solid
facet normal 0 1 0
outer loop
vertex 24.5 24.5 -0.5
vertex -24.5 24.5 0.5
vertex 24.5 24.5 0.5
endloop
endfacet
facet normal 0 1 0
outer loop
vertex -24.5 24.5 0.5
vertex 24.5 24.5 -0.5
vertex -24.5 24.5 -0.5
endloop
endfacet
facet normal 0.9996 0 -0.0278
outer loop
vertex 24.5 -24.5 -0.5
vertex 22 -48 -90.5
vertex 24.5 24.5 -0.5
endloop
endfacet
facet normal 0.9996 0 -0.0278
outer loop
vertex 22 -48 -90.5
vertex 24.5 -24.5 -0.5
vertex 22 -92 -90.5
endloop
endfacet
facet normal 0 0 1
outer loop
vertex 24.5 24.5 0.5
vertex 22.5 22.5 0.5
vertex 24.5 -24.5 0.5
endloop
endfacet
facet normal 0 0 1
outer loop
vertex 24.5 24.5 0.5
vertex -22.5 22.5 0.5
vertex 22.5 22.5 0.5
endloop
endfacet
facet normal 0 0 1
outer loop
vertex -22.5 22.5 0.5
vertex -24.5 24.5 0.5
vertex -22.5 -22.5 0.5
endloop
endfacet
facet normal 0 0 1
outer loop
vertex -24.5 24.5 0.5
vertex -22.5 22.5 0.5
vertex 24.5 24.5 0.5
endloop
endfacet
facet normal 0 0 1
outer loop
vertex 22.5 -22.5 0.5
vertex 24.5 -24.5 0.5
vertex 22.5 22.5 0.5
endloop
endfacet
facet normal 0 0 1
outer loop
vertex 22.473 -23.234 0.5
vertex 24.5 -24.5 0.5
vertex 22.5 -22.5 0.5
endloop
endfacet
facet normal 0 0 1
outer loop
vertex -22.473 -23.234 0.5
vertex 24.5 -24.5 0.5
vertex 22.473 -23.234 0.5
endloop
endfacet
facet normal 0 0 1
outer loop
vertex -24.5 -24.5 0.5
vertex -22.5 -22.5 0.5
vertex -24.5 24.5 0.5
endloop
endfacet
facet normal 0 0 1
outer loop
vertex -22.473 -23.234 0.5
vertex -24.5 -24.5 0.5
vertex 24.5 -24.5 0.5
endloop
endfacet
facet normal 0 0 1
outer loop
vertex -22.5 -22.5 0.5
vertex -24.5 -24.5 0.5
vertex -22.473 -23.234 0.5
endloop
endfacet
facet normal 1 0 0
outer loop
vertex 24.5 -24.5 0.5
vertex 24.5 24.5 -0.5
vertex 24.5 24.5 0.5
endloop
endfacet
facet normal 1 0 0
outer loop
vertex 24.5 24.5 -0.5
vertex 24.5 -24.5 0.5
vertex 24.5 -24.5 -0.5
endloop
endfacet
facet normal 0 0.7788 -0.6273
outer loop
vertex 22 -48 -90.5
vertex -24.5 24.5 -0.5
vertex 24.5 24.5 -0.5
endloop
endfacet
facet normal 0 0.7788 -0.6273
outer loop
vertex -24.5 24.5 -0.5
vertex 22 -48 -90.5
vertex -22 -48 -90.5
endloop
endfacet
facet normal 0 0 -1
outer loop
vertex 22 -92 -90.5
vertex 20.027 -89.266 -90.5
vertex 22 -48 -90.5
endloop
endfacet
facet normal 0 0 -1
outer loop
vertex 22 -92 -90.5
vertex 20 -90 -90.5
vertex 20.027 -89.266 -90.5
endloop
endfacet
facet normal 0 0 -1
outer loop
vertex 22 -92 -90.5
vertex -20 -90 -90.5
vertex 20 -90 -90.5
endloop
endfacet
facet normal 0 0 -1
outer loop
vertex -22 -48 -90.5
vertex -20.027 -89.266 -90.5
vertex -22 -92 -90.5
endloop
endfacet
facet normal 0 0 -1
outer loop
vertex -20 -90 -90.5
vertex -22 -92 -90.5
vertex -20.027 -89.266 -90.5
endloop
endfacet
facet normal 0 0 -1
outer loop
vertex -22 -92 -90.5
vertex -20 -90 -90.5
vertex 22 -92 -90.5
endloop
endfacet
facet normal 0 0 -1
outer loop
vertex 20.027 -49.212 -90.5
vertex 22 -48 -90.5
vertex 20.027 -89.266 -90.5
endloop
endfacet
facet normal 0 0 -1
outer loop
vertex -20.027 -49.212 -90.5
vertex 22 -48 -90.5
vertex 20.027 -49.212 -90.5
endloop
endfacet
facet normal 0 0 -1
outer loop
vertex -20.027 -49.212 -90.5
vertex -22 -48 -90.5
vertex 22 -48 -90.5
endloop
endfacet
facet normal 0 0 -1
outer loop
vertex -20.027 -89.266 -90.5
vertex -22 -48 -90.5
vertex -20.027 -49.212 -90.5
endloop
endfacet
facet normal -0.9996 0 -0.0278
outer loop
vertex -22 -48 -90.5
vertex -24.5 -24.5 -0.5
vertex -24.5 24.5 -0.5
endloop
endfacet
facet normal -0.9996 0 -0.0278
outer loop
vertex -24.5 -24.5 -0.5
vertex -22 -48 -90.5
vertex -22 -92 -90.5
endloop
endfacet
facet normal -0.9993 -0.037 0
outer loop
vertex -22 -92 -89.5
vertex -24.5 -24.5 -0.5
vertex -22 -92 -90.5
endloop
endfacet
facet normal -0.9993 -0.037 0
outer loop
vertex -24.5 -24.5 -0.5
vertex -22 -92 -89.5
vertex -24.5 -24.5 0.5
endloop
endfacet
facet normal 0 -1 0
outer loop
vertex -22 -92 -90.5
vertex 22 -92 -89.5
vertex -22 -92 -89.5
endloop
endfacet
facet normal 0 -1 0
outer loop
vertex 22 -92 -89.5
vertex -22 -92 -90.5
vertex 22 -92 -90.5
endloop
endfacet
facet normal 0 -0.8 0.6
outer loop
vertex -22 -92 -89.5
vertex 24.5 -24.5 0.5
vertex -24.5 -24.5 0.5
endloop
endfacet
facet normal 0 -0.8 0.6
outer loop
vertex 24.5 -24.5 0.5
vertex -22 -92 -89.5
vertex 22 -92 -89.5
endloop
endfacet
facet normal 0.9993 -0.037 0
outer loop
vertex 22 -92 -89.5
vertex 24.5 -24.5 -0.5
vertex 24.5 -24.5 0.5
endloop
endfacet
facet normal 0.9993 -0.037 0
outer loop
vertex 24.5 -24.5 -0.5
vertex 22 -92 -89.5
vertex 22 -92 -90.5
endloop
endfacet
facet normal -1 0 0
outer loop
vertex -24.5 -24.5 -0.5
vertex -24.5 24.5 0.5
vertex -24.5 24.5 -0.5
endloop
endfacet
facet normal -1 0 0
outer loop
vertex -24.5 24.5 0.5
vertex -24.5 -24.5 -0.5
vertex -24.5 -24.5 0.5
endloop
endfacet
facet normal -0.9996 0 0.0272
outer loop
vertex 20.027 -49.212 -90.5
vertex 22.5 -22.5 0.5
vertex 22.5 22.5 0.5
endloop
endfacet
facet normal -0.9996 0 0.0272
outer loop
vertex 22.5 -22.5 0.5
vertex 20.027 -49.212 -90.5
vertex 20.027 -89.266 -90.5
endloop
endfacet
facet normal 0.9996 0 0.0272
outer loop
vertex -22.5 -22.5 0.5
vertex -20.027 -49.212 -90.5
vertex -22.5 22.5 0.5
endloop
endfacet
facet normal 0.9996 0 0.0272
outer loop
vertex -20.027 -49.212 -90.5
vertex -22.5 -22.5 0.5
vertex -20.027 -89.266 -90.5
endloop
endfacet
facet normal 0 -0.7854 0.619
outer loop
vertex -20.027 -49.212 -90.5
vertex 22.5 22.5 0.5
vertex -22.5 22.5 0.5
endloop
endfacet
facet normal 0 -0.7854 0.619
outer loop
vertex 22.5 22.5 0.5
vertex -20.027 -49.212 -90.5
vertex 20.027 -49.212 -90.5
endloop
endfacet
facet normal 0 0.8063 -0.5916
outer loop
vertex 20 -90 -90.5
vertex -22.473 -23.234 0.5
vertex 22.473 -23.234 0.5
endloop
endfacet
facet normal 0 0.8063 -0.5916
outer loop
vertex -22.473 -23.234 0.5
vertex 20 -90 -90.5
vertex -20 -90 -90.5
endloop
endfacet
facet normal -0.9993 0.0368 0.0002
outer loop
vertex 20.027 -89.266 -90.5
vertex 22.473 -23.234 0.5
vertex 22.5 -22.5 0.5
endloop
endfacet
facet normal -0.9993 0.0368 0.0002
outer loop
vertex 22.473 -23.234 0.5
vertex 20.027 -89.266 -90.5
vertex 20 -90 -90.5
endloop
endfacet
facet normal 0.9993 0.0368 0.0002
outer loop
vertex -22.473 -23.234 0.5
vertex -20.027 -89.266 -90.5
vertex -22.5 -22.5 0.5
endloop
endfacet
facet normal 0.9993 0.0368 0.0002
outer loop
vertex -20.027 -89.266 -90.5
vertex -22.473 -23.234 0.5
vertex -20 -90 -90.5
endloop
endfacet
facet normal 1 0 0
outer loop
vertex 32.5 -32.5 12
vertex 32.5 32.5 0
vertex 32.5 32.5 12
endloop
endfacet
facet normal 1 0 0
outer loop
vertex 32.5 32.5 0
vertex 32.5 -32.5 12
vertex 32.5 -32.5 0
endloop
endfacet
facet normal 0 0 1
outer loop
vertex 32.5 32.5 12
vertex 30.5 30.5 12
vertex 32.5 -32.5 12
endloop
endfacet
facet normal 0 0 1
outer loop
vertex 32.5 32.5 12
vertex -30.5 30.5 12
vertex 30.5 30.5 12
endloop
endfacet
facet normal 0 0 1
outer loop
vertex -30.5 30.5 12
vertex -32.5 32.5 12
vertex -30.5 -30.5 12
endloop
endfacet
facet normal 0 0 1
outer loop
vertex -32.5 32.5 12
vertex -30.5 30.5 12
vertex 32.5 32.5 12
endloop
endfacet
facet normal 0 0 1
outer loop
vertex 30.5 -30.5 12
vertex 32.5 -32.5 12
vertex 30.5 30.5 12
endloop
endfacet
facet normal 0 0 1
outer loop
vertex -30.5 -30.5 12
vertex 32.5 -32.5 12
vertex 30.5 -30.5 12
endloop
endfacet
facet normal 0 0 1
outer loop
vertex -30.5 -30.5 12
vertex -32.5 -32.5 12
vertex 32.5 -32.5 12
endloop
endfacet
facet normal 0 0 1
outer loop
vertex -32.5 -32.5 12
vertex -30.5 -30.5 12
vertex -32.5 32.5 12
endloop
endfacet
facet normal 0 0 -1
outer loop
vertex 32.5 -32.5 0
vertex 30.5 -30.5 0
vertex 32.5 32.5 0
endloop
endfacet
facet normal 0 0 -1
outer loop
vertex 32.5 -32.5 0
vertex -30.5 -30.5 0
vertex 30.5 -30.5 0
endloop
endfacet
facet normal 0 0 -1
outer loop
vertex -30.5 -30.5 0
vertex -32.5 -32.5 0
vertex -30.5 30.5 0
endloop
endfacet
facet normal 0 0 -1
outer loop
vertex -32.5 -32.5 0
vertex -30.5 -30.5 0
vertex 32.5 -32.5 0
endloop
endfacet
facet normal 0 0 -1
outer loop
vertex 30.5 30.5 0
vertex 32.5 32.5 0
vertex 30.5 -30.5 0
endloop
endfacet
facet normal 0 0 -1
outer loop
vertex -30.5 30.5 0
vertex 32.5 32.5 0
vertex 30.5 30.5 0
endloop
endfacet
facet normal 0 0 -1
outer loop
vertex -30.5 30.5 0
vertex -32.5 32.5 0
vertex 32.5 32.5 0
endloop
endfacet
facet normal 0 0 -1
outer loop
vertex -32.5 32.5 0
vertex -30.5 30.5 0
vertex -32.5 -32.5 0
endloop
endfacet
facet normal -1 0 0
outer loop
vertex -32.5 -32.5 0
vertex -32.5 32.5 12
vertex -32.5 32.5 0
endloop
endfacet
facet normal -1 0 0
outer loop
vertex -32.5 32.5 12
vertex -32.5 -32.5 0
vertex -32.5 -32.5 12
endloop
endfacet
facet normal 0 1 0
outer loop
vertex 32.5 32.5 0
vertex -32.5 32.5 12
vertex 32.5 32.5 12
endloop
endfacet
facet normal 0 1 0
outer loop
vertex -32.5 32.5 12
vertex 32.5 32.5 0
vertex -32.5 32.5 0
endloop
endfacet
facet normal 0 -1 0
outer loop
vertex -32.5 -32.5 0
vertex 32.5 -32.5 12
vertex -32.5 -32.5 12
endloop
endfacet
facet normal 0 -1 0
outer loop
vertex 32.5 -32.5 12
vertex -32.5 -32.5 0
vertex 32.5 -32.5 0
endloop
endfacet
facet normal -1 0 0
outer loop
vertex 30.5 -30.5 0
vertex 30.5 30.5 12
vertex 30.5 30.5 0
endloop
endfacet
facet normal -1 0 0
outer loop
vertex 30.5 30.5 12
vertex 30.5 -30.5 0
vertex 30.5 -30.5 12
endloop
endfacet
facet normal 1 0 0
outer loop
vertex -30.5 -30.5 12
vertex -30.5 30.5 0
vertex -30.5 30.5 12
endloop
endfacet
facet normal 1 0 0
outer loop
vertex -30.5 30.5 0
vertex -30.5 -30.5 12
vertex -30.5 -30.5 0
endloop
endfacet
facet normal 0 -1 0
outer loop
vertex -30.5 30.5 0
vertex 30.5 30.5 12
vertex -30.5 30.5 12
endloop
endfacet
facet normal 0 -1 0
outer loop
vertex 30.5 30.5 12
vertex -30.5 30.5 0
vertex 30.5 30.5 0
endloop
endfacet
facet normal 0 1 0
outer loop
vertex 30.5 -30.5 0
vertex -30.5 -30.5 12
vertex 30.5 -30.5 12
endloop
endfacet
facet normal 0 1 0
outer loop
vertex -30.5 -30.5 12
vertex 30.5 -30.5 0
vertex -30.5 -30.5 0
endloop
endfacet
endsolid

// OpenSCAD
// file: common.scad
// common.scad — every dimension in the feeder lives here.
// Change a value, re-run ../check.sh, and every part regrows together.

/* ---------- Printer envelope ---------- */
bed_x = 220;
bed_y = 220;
bed_z = 250;

/* ---------- Material and process ---------- */
wall      = 2.0;    // nominal wall thickness (5 perimeters at 0.4 nozzle)
fit_slide = 0.30;   // clearance for parts that must move against each other
fit_press = 0.15;   // clearance for parts pressed together
$fn       = 96;

/* ---------- Fasteners ---------- */
m3_free = 3.4;      // M3 clearance hole
m3_tap  = 2.8;      // M3 self-tapping into plastic
m4_free = 4.5;

/* ---------- Load cells (VERIFY against the cells you actually buy) ----------
   Figures below are for the common YZC-133 straight bar. Bolt spacing varies
   between suppliers; measure yours before printing the base or the platform. */
cell_l            = 80;
cell_w            = 12.7;
cell_h            = 12.7;
cell_bolt_spacing = 15;   // centre-to-centre, at each end
cell_gap          = 3;    // spacer thickness — the beam MUST be free to flex

/* ---------- Food model ---------- */
kibble_density = 0.40;   // g/cm^3, dry kibble bulk density

/* ---------- Hopper ---------- */
hopper_volume_l = 2.0;
hopper_mouth    = 140;   // inner, square, at the top
hopper_throat   = 55;    // inner, square, at the bottom

// Square frustum volume: V = h/3 * (A1 + A2 + sqrt(A1*A2))
// For squares sqrt(A1*A2) collapses to mouth*throat, so height is exact:
hopper_h = 3 * hopper_volume_l * 1000000 /
           (hopper_mouth*hopper_mouth + hopper_throat*hopper_throat +
            hopper_mouth*hopper_throat);

hopper_run        = (hopper_mouth - hopper_throat) / 2;
hopper_wall_angle = atan(hopper_h / hopper_run);   // from horizontal
hopper_taper_rate = (hopper_mouth - hopper_throat) / hopper_h;
hopper_capacity_g = hopper_volume_l * 1000 * kibble_density;

/* ---------- Drum valve ---------- */
drum_dia       = 50;
drum_len       = 60;
drum_clearance = 0.4;                      // radial
drum_bore      = drum_dia + 2*drum_clearance;
pocket_depth   = 11.3;                     // segment depth of the scoop
shaft_dia      = 6;
shaft_len      = 8;

// Circular-segment maths. OpenSCAD trig is in DEGREES; the segment area
// formula needs the angle in RADIANS, hence the two forms below.
drum_r          = drum_dia / 2;
pocket_theta    = 2 * acos(1 - pocket_depth/drum_r);        // degrees
pocket_theta_r  = pocket_theta * PI / 180;                  // radians
pocket_area     = drum_r*drum_r/2 * (pocket_theta_r - sin(pocket_theta));
pocket_volume   = pocket_area * drum_len;                   // mm^3
sweep_grams     = pocket_volume / 1000 * kibble_density;    // DERIVED, not assumed

/* ---------- Valve housing ---------- */
housing_x = drum_len + 4*wall;      // along the drum axis
housing_y = drum_bore + 4*wall;
housing_z = drum_bore + 4*wall;
outlet_x  = 45;
outlet_y  = 45;

/* ---------- Chute ---------- */
chute_forward = 70;    // how far forward of the tower the food lands
chute_drop    = 90;    // vertical fall from valve outlet to chute exit
chute_exit    = 40;
chute_clear   = 40;    // exit height above the bowl rim — impulse, not load

/* ---------- Bowl and platform ---------- */
bowl_dia     = 140;    // the BOUGHT stainless/ceramic bowl
platform_dia = 150;
platform_t   = 5;
ring_w       = 3;
ring_h       = 8;
bowl_gap     = 6;      // air on every side — the isolation gap

/* ---------- Base and tower ---------- */
base_size = 190;
base_t    = 6;
bay_h     = 28;        // electronics bay height
tower_w   = 90;
tower_d   = 70;
tower_h   = 150;

/* ---------- Head ---------- */
head_tilt   = 30;      // camera, degrees down from horizontal
cam_pcb     = [40, 40, 1.6];
sr04_dia    = 16;
sr04_pitch  = 26;      // centre-to-centre of the two transducers

/* ---------- Derived overall ---------- */
total_h = base_t + bay_h + tower_h + housing_z + hopper_h;

/* ---------- Assertions: the things that silently ruin a print ---------- */
assert(hopper_wall_angle >= 60,
       str("Hopper wall ", hopper_wall_angle, " deg is below 60 - kibble will bridge"));
assert(hopper_h + 2*wall <= bed_z,
       str("Hopper ", hopper_h, " mm exceeds bed Z ", bed_z));
assert(hopper_mouth + 2*wall <= bed_x,
       "Hopper mouth exceeds bed X");
assert(base_size <= bed_x && base_size <= bed_y,
       "Base exceeds bed footprint");
assert(platform_dia <= bed_x, "Bowl platform exceeds bed X");
assert(drum_clearance > 0, "Drum clearance must be positive or the drum seizes");
assert(drum_bore > drum_dia, "Drum bore must exceed drum diameter");
assert(pocket_depth < drum_r,
       "Pocket deeper than the drum radius - the scoop would cut through the axis");
assert(sweep_grams > 6 && sweep_grams < 10,
       str("Sweep delivers ", sweep_grams, " g - outside the 6-10 g design window"));
assert(bowl_gap > 0, "Bowl isolation gap must be positive");
assert(cell_gap > 0, "Load cell needs a flex gap or it reads nothing");
assert(chute_forward + 40 <= bed_y,
       "Bowl arm exceeds bed Y - split it or shorten chute_forward");

/* ---------- Shared geometry ---------- */
// A square frustum, bottom face on the XY plane, centred on Z.
module frustum(bottom, top, h) {
  linear_extrude(height = h, scale = top/bottom)
    square([bottom, bottom], center = true);
}

// A rectangular tube used for the labyrinth lip on the lid and hopper mouth.
module lip(inner, thickness, h) {
  difference() {
    cube([inner + 2*thickness, inner + 2*thickness, h], center = true);
    cube([inner, inner, h + 1], center = true);
  }
}

// Four bolt holes on a square pattern.
module bolt_square(spacing, dia, h) {
  for (i = [0:3])
    rotate([0, 0, 90*i])
      translate([spacing/2, spacing/2, 0])
        cylinder(d = dia, h = h, center = true, $fn = 24);
}

// The cantilever footprint a load cell bolts into: two holes plus a relief slot.
module cell_mount(dia = m3_tap, h = 10) {
  for (y = [-cell_bolt_spacing/2, cell_bolt_spacing/2])
    translate([0, y, 0]) cylinder(d = dia, h = h, center = true, $fn = 24);
}

echo(str("hopper_h = ", hopper_h, " mm"));
echo(str("hopper wall angle = ", hopper_wall_angle, " deg"));
echo(str("hopper capacity = ", hopper_capacity_g, " g"));
echo(str("sweep = ", sweep_grams, " g"));
echo(str("total height = ", total_h, " mm"));
// main file
include <common.scad>

skirt_h   = 12;
skirt_gap = 6;    // the non-contact labyrinth gap around the floating assembly

module chute() {
  union() {
    difference() {
      // Outer funnel: outlet swept forward (-Y, toward the bowl) and down.
      hull() {
        cube([outlet_x + 2*wall, outlet_y + 2*wall, 1], center = true);
        translate([0, -chute_forward, -chute_drop])
          cube([chute_exit + 2*wall, chute_exit + 2*wall, 1], center = true);
      }
      // Inner void, extended past both ends.
      hull() {
        translate([0, 0, 1]) cube([outlet_x, outlet_y, 1], center = true);
        translate([0, -chute_forward, -chute_drop - 1])
          cube([chute_exit, chute_exit, 1], center = true);
      }
    }

    // Non-contact skirt. It overlaps the floating valve housing so kibble
    // cannot escape through the isolation gap. It MUST NOT TOUCH the housing —
    // skirt_gap is that promise expressed as geometry.
    translate([0, 0, skirt_h/2])
      lip(outlet_x + 2*wall + 2*skirt_gap, wall, skirt_h);
  }
}

chute();
